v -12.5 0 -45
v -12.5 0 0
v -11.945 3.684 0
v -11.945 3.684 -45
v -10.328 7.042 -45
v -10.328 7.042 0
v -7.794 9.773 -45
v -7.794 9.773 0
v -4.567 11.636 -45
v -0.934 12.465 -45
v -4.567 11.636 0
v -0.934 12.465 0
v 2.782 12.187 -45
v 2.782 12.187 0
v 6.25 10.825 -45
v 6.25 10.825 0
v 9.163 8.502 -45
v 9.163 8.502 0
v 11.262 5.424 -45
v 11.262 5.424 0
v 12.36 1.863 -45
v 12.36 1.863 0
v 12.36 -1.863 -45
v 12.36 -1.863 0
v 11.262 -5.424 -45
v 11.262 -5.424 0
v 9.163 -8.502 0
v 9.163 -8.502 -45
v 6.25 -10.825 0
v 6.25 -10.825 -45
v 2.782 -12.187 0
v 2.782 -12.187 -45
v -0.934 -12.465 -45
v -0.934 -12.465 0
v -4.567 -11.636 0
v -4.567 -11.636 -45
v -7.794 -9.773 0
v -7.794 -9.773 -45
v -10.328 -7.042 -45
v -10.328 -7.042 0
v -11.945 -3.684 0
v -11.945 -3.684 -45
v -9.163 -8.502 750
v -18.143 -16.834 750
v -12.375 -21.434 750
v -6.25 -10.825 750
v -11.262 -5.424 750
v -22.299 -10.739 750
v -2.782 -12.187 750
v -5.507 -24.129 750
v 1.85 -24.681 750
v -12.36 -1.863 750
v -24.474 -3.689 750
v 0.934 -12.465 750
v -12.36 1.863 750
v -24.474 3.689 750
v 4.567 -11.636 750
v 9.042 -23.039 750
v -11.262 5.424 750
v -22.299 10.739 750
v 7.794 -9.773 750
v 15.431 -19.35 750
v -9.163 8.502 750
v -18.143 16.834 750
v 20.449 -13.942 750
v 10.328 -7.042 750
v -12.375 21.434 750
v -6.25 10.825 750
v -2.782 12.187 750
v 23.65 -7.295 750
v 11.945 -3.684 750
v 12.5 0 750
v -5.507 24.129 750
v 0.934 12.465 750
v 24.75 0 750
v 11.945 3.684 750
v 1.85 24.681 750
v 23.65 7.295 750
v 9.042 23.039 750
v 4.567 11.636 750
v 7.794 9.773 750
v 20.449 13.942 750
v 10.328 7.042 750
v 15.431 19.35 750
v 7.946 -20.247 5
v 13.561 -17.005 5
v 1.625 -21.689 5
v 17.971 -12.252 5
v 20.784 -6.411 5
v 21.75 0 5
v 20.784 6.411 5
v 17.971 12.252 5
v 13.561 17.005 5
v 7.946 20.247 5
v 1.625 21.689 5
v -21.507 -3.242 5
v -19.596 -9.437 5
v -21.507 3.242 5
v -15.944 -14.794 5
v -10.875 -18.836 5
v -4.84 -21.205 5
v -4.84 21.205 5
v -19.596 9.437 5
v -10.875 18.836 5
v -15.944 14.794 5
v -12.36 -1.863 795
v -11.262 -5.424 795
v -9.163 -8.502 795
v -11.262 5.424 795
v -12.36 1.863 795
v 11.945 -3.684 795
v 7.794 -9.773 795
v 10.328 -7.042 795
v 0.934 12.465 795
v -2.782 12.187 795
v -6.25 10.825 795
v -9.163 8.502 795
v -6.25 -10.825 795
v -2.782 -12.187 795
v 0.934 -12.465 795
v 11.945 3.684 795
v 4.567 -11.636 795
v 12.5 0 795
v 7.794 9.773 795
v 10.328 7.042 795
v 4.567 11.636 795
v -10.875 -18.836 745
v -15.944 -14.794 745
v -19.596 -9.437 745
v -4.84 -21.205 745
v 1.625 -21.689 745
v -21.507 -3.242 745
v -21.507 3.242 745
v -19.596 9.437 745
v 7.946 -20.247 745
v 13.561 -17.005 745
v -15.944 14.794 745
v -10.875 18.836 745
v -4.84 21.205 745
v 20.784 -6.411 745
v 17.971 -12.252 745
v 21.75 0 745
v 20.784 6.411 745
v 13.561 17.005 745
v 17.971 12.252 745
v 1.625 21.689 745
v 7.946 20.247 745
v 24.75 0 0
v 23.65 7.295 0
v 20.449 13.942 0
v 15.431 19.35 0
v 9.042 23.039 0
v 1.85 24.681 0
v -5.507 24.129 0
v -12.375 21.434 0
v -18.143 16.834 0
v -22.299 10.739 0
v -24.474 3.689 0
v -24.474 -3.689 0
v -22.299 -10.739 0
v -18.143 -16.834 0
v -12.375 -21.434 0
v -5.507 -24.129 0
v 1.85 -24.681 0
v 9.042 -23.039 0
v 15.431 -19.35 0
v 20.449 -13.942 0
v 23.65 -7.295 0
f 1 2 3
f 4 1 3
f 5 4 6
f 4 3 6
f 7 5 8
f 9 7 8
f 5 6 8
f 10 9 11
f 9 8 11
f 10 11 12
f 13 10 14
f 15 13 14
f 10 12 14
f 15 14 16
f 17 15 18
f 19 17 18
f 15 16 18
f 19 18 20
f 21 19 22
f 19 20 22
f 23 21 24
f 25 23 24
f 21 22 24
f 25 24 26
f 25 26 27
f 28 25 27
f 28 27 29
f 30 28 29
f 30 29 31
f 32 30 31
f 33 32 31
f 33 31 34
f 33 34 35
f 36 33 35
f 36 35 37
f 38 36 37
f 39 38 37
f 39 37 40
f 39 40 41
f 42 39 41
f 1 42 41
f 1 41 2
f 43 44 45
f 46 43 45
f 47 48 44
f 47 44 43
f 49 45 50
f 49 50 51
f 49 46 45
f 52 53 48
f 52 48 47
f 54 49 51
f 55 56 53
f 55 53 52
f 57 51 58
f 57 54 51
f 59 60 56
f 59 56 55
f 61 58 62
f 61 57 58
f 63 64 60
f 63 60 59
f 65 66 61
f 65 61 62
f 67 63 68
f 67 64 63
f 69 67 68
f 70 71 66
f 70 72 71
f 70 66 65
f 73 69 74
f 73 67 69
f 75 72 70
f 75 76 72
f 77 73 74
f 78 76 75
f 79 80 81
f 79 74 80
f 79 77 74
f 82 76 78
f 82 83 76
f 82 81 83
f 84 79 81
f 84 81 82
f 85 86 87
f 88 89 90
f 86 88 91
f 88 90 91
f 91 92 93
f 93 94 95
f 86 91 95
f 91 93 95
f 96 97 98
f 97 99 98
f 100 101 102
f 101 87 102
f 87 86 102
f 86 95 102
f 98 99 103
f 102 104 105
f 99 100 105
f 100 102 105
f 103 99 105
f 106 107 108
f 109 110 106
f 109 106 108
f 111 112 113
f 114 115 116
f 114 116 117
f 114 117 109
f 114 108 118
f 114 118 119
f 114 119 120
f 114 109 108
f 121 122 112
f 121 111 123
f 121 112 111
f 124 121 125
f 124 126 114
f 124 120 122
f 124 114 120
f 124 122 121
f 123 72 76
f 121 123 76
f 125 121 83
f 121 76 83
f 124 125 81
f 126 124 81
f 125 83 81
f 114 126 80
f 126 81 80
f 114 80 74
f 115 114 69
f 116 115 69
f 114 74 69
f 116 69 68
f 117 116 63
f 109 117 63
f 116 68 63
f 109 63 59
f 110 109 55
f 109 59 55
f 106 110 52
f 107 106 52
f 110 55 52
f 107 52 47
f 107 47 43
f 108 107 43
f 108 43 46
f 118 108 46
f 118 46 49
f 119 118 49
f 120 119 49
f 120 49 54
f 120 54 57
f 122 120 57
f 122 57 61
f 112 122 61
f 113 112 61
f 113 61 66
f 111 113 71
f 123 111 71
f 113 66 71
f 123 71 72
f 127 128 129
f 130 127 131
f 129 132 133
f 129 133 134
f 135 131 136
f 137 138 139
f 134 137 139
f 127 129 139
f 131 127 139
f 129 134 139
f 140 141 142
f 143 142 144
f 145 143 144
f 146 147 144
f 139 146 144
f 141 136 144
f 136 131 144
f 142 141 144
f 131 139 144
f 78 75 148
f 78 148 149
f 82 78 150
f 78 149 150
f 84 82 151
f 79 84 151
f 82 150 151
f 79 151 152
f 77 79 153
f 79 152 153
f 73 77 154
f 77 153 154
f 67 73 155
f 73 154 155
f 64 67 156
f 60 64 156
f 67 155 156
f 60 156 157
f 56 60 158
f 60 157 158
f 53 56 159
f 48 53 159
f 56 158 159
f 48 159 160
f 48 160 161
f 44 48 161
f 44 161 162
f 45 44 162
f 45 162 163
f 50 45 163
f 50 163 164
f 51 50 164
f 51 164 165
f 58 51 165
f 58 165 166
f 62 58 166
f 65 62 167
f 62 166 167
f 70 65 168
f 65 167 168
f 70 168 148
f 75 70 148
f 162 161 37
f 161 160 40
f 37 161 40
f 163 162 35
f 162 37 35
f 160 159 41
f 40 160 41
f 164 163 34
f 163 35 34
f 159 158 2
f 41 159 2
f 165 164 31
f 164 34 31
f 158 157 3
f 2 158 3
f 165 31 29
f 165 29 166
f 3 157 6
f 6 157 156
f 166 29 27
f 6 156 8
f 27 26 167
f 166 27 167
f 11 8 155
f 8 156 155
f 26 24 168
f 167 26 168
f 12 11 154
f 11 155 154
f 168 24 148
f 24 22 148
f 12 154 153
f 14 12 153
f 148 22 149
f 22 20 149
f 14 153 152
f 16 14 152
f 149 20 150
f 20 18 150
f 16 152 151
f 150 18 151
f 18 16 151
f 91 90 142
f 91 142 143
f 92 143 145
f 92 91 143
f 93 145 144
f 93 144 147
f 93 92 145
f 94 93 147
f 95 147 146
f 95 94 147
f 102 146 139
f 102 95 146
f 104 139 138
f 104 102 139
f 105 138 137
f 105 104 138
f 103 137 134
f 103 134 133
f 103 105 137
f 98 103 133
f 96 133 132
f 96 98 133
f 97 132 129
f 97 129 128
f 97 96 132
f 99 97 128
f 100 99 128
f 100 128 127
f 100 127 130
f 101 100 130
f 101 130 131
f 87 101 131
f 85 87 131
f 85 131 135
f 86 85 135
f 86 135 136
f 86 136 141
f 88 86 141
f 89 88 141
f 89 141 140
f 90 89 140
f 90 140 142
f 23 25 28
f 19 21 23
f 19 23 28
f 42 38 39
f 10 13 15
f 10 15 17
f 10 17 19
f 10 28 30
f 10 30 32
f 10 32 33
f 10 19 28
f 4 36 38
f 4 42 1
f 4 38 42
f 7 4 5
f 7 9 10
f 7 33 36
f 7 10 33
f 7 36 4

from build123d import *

# Parameters (mm, degrees)
SKETCH1_R                = 24.75
SKETCH1_R_2              = 21.75
BOSS_EXTRUDE1_DEPTH      = 750
SKETCH2_R                = 21.75
SKETCH2_R_2              = 12.5
BOSS_EXTRUDE2_DEPTH      = 5
SKETCH3_R                = 21.75
SKETCH3_R_2              = 12.5
BOSS_EXTRUDE3_DEPTH      = 5
SKETCH4_R                = 12.5
BOSS_EXTRUDE4_DEPTH      = 45
BOSS_EXTRUDE4_DEPTH_BACK = 5
SKETCH5_R                = 12.5
BOSS_EXTRUDE5_DEPTH      = 45
BOSS_EXTRUDE5_DEPTH_BACK = 5


with BuildPart() as part:
    # Sketch1 → Boss-Extrude1 (new body)
    with BuildSketch(Plane.XY):
        Circle(SKETCH1_R)
        Circle(SKETCH1_R_2, mode=Mode.SUBTRACT)
    extrude(amount=BOSS_EXTRUDE1_DEPTH)

    # Sketch2 → Boss-Extrude2 (add)
    with BuildSketch(Plane.XY):
        Circle(SKETCH2_R)
        Circle(SKETCH2_R_2, mode=Mode.SUBTRACT)
    extrude(amount=BOSS_EXTRUDE2_DEPTH)

    # Sketch3 → Boss-Extrude3 (add)
    with BuildSketch(Plane.XY.offset(750)):
        Circle(SKETCH3_R)
        Circle(SKETCH3_R_2, mode=Mode.SUBTRACT)
    extrude(amount=-BOSS_EXTRUDE3_DEPTH)

    # Sketch4 → Boss-Extrude4 (add, two sides)
    with BuildSketch(Plane.XY.offset(750)) as boss_extrude4_sk:
        Circle(SKETCH4_R)
    extrude(amount=BOSS_EXTRUDE4_DEPTH)
    extrude(boss_extrude4_sk.sketch, amount=-BOSS_EXTRUDE4_DEPTH_BACK)

    # Sketch5 → Boss-Extrude5 (add, two sides)
    with BuildSketch(Plane(origin=(0, 0, 0), x_dir=(-1, 0, 0), z_dir=(0, 0, -1))) as boss_extrude5_sk:
        Circle(SKETCH5_R)
    extrude(amount=BOSS_EXTRUDE5_DEPTH)
    extrude(boss_extrude5_sk.sketch, amount=-BOSS_EXTRUDE5_DEPTH_BACK)


solid = part.part
